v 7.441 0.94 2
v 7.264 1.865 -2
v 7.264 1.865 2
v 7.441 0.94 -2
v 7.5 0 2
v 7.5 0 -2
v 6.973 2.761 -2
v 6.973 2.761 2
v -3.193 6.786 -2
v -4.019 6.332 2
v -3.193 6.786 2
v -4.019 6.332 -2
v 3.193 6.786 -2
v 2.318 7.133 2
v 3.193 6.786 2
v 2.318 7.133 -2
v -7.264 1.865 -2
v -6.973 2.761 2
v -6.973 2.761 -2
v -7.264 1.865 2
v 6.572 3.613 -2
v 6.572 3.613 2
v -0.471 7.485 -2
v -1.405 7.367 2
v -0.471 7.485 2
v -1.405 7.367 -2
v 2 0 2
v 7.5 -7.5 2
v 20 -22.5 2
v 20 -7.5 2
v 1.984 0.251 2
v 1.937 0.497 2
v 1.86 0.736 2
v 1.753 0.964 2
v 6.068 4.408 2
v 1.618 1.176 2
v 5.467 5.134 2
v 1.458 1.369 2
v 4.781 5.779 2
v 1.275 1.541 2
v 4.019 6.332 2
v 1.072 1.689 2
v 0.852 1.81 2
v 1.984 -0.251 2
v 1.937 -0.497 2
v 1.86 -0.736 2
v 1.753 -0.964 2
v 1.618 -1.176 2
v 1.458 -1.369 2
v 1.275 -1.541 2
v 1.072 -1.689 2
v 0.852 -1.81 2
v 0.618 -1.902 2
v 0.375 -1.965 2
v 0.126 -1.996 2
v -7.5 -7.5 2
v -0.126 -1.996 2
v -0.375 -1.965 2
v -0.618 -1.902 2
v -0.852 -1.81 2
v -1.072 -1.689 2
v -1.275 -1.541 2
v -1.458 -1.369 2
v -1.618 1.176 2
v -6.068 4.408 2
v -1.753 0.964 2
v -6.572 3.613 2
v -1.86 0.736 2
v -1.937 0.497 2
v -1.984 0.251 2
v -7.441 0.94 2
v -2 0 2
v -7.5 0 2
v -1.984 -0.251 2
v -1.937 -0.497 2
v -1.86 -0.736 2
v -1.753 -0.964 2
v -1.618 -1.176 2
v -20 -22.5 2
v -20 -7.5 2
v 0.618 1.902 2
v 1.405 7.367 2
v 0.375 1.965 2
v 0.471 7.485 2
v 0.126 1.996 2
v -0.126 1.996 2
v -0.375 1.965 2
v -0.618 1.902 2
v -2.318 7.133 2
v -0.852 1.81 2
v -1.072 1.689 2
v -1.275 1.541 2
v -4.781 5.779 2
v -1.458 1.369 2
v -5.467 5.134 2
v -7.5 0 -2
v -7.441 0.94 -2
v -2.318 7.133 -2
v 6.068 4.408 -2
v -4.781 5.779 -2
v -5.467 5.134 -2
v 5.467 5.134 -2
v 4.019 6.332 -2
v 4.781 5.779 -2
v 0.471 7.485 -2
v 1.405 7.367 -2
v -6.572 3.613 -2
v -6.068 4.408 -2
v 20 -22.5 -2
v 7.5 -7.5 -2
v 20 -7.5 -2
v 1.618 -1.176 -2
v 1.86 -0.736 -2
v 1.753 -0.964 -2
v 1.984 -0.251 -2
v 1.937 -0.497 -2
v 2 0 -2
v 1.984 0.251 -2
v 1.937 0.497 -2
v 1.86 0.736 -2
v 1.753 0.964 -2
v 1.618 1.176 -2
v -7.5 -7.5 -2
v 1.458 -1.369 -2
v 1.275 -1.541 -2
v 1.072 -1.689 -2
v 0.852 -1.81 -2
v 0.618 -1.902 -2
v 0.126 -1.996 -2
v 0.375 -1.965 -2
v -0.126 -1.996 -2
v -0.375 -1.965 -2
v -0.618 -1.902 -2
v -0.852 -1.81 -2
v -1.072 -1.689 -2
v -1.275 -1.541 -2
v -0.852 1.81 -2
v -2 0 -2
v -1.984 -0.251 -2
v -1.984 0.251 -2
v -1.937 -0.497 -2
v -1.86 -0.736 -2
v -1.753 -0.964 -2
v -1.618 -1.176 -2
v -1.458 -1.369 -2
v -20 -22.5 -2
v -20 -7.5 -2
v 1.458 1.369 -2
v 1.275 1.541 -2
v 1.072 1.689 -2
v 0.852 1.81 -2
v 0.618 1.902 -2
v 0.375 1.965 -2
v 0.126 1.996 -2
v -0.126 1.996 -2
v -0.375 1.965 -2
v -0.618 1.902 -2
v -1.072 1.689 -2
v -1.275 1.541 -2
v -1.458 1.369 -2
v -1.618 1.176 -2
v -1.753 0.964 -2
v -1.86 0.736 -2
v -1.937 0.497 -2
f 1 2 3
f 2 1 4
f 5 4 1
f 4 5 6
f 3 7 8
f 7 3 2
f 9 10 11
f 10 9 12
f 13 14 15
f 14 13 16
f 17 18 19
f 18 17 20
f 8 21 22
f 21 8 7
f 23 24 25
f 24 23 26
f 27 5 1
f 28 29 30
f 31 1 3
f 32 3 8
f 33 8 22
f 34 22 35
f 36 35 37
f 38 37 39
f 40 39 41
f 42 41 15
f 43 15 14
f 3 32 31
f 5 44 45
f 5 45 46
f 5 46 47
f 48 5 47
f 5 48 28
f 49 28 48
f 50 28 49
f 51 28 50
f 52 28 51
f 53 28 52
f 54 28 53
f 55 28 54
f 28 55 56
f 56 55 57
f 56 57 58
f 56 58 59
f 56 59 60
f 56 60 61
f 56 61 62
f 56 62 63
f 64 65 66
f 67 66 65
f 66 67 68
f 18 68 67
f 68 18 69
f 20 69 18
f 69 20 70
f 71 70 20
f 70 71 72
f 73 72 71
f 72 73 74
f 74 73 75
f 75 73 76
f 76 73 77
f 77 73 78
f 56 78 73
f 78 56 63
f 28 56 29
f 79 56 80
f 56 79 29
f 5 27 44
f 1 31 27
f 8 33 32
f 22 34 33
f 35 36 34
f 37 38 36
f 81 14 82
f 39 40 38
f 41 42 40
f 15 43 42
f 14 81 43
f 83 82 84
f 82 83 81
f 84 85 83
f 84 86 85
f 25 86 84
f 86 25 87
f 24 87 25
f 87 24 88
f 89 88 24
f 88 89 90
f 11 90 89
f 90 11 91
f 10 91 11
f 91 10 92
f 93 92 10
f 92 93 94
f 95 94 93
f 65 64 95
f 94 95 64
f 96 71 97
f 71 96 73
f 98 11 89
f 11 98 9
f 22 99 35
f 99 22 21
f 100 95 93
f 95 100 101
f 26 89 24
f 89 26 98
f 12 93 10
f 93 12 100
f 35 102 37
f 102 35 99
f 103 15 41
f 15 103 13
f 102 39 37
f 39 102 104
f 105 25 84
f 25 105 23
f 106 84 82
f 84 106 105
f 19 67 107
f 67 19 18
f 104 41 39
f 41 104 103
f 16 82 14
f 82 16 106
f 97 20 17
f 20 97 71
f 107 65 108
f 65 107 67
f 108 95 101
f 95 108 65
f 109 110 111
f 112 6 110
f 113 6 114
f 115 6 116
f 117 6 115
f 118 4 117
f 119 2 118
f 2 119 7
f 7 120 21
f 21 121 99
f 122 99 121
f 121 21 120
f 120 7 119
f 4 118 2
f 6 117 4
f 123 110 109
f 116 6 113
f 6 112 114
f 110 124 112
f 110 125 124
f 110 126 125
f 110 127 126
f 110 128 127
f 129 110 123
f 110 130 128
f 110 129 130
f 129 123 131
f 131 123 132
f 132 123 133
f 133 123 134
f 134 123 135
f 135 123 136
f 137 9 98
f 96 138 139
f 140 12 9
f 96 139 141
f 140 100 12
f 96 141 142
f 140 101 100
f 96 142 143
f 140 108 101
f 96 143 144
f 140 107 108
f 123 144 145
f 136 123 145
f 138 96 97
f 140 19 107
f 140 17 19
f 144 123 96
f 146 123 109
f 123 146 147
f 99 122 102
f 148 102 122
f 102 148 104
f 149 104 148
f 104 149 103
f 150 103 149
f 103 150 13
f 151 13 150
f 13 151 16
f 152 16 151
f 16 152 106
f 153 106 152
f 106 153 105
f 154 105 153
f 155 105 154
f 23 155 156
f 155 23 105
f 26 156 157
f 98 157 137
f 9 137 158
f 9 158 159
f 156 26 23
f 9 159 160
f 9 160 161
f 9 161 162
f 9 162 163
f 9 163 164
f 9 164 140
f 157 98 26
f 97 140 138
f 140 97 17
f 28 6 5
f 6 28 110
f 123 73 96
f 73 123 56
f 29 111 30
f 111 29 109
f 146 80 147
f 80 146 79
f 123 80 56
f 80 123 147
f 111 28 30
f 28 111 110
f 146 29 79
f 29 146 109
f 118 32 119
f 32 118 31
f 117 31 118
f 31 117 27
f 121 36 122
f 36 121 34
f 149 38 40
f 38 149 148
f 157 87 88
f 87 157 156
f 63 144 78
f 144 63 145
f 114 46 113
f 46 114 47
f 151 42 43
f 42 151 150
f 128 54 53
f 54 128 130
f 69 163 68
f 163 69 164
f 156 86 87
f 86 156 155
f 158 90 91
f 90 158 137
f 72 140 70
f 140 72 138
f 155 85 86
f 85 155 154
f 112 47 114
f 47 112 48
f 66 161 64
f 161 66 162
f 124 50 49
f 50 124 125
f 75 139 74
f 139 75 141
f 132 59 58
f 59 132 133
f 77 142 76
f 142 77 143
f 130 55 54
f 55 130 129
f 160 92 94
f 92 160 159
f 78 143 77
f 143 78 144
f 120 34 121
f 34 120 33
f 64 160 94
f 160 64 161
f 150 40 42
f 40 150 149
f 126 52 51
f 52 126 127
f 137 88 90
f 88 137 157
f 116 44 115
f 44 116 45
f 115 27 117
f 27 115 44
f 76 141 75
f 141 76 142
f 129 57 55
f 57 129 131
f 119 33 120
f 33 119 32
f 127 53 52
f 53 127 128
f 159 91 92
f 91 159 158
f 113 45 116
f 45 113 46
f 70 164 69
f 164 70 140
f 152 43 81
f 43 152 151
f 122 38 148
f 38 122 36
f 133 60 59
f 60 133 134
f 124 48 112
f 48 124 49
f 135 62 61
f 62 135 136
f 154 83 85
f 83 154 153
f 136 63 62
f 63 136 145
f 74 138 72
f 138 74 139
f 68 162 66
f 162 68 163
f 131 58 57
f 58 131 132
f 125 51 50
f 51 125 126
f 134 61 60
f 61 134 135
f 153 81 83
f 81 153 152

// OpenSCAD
// Tab thickness
tab_thickness = 4;

// Width of the sticky-uppy-bit
tab_width = 15;

// Width of the bit that bears the weight
tab_shoulder = 40;

// Screw hold diameter
screw_diameter = 4;

/* [Hidden] */
tab_radius = tab_width / 2;
screw_radius = screw_diameter / 2;

$fn = 50;

module tab() {
  difference() {
    union() {
      cylinder(h = tab_thickness, r = tab_radius, center = true);
      translate([0, -tab_radius, 0]) {
        cube([tab_width, tab_width, tab_thickness], center = true);
      }
      translate([0, -tab_width, 0]) {
        cube([tab_shoulder, tab_width, tab_thickness], center = true);
      }
    }
    cylinder(h = tab_thickness + 1, r = screw_radius, center = true);
  }
}

tab();
